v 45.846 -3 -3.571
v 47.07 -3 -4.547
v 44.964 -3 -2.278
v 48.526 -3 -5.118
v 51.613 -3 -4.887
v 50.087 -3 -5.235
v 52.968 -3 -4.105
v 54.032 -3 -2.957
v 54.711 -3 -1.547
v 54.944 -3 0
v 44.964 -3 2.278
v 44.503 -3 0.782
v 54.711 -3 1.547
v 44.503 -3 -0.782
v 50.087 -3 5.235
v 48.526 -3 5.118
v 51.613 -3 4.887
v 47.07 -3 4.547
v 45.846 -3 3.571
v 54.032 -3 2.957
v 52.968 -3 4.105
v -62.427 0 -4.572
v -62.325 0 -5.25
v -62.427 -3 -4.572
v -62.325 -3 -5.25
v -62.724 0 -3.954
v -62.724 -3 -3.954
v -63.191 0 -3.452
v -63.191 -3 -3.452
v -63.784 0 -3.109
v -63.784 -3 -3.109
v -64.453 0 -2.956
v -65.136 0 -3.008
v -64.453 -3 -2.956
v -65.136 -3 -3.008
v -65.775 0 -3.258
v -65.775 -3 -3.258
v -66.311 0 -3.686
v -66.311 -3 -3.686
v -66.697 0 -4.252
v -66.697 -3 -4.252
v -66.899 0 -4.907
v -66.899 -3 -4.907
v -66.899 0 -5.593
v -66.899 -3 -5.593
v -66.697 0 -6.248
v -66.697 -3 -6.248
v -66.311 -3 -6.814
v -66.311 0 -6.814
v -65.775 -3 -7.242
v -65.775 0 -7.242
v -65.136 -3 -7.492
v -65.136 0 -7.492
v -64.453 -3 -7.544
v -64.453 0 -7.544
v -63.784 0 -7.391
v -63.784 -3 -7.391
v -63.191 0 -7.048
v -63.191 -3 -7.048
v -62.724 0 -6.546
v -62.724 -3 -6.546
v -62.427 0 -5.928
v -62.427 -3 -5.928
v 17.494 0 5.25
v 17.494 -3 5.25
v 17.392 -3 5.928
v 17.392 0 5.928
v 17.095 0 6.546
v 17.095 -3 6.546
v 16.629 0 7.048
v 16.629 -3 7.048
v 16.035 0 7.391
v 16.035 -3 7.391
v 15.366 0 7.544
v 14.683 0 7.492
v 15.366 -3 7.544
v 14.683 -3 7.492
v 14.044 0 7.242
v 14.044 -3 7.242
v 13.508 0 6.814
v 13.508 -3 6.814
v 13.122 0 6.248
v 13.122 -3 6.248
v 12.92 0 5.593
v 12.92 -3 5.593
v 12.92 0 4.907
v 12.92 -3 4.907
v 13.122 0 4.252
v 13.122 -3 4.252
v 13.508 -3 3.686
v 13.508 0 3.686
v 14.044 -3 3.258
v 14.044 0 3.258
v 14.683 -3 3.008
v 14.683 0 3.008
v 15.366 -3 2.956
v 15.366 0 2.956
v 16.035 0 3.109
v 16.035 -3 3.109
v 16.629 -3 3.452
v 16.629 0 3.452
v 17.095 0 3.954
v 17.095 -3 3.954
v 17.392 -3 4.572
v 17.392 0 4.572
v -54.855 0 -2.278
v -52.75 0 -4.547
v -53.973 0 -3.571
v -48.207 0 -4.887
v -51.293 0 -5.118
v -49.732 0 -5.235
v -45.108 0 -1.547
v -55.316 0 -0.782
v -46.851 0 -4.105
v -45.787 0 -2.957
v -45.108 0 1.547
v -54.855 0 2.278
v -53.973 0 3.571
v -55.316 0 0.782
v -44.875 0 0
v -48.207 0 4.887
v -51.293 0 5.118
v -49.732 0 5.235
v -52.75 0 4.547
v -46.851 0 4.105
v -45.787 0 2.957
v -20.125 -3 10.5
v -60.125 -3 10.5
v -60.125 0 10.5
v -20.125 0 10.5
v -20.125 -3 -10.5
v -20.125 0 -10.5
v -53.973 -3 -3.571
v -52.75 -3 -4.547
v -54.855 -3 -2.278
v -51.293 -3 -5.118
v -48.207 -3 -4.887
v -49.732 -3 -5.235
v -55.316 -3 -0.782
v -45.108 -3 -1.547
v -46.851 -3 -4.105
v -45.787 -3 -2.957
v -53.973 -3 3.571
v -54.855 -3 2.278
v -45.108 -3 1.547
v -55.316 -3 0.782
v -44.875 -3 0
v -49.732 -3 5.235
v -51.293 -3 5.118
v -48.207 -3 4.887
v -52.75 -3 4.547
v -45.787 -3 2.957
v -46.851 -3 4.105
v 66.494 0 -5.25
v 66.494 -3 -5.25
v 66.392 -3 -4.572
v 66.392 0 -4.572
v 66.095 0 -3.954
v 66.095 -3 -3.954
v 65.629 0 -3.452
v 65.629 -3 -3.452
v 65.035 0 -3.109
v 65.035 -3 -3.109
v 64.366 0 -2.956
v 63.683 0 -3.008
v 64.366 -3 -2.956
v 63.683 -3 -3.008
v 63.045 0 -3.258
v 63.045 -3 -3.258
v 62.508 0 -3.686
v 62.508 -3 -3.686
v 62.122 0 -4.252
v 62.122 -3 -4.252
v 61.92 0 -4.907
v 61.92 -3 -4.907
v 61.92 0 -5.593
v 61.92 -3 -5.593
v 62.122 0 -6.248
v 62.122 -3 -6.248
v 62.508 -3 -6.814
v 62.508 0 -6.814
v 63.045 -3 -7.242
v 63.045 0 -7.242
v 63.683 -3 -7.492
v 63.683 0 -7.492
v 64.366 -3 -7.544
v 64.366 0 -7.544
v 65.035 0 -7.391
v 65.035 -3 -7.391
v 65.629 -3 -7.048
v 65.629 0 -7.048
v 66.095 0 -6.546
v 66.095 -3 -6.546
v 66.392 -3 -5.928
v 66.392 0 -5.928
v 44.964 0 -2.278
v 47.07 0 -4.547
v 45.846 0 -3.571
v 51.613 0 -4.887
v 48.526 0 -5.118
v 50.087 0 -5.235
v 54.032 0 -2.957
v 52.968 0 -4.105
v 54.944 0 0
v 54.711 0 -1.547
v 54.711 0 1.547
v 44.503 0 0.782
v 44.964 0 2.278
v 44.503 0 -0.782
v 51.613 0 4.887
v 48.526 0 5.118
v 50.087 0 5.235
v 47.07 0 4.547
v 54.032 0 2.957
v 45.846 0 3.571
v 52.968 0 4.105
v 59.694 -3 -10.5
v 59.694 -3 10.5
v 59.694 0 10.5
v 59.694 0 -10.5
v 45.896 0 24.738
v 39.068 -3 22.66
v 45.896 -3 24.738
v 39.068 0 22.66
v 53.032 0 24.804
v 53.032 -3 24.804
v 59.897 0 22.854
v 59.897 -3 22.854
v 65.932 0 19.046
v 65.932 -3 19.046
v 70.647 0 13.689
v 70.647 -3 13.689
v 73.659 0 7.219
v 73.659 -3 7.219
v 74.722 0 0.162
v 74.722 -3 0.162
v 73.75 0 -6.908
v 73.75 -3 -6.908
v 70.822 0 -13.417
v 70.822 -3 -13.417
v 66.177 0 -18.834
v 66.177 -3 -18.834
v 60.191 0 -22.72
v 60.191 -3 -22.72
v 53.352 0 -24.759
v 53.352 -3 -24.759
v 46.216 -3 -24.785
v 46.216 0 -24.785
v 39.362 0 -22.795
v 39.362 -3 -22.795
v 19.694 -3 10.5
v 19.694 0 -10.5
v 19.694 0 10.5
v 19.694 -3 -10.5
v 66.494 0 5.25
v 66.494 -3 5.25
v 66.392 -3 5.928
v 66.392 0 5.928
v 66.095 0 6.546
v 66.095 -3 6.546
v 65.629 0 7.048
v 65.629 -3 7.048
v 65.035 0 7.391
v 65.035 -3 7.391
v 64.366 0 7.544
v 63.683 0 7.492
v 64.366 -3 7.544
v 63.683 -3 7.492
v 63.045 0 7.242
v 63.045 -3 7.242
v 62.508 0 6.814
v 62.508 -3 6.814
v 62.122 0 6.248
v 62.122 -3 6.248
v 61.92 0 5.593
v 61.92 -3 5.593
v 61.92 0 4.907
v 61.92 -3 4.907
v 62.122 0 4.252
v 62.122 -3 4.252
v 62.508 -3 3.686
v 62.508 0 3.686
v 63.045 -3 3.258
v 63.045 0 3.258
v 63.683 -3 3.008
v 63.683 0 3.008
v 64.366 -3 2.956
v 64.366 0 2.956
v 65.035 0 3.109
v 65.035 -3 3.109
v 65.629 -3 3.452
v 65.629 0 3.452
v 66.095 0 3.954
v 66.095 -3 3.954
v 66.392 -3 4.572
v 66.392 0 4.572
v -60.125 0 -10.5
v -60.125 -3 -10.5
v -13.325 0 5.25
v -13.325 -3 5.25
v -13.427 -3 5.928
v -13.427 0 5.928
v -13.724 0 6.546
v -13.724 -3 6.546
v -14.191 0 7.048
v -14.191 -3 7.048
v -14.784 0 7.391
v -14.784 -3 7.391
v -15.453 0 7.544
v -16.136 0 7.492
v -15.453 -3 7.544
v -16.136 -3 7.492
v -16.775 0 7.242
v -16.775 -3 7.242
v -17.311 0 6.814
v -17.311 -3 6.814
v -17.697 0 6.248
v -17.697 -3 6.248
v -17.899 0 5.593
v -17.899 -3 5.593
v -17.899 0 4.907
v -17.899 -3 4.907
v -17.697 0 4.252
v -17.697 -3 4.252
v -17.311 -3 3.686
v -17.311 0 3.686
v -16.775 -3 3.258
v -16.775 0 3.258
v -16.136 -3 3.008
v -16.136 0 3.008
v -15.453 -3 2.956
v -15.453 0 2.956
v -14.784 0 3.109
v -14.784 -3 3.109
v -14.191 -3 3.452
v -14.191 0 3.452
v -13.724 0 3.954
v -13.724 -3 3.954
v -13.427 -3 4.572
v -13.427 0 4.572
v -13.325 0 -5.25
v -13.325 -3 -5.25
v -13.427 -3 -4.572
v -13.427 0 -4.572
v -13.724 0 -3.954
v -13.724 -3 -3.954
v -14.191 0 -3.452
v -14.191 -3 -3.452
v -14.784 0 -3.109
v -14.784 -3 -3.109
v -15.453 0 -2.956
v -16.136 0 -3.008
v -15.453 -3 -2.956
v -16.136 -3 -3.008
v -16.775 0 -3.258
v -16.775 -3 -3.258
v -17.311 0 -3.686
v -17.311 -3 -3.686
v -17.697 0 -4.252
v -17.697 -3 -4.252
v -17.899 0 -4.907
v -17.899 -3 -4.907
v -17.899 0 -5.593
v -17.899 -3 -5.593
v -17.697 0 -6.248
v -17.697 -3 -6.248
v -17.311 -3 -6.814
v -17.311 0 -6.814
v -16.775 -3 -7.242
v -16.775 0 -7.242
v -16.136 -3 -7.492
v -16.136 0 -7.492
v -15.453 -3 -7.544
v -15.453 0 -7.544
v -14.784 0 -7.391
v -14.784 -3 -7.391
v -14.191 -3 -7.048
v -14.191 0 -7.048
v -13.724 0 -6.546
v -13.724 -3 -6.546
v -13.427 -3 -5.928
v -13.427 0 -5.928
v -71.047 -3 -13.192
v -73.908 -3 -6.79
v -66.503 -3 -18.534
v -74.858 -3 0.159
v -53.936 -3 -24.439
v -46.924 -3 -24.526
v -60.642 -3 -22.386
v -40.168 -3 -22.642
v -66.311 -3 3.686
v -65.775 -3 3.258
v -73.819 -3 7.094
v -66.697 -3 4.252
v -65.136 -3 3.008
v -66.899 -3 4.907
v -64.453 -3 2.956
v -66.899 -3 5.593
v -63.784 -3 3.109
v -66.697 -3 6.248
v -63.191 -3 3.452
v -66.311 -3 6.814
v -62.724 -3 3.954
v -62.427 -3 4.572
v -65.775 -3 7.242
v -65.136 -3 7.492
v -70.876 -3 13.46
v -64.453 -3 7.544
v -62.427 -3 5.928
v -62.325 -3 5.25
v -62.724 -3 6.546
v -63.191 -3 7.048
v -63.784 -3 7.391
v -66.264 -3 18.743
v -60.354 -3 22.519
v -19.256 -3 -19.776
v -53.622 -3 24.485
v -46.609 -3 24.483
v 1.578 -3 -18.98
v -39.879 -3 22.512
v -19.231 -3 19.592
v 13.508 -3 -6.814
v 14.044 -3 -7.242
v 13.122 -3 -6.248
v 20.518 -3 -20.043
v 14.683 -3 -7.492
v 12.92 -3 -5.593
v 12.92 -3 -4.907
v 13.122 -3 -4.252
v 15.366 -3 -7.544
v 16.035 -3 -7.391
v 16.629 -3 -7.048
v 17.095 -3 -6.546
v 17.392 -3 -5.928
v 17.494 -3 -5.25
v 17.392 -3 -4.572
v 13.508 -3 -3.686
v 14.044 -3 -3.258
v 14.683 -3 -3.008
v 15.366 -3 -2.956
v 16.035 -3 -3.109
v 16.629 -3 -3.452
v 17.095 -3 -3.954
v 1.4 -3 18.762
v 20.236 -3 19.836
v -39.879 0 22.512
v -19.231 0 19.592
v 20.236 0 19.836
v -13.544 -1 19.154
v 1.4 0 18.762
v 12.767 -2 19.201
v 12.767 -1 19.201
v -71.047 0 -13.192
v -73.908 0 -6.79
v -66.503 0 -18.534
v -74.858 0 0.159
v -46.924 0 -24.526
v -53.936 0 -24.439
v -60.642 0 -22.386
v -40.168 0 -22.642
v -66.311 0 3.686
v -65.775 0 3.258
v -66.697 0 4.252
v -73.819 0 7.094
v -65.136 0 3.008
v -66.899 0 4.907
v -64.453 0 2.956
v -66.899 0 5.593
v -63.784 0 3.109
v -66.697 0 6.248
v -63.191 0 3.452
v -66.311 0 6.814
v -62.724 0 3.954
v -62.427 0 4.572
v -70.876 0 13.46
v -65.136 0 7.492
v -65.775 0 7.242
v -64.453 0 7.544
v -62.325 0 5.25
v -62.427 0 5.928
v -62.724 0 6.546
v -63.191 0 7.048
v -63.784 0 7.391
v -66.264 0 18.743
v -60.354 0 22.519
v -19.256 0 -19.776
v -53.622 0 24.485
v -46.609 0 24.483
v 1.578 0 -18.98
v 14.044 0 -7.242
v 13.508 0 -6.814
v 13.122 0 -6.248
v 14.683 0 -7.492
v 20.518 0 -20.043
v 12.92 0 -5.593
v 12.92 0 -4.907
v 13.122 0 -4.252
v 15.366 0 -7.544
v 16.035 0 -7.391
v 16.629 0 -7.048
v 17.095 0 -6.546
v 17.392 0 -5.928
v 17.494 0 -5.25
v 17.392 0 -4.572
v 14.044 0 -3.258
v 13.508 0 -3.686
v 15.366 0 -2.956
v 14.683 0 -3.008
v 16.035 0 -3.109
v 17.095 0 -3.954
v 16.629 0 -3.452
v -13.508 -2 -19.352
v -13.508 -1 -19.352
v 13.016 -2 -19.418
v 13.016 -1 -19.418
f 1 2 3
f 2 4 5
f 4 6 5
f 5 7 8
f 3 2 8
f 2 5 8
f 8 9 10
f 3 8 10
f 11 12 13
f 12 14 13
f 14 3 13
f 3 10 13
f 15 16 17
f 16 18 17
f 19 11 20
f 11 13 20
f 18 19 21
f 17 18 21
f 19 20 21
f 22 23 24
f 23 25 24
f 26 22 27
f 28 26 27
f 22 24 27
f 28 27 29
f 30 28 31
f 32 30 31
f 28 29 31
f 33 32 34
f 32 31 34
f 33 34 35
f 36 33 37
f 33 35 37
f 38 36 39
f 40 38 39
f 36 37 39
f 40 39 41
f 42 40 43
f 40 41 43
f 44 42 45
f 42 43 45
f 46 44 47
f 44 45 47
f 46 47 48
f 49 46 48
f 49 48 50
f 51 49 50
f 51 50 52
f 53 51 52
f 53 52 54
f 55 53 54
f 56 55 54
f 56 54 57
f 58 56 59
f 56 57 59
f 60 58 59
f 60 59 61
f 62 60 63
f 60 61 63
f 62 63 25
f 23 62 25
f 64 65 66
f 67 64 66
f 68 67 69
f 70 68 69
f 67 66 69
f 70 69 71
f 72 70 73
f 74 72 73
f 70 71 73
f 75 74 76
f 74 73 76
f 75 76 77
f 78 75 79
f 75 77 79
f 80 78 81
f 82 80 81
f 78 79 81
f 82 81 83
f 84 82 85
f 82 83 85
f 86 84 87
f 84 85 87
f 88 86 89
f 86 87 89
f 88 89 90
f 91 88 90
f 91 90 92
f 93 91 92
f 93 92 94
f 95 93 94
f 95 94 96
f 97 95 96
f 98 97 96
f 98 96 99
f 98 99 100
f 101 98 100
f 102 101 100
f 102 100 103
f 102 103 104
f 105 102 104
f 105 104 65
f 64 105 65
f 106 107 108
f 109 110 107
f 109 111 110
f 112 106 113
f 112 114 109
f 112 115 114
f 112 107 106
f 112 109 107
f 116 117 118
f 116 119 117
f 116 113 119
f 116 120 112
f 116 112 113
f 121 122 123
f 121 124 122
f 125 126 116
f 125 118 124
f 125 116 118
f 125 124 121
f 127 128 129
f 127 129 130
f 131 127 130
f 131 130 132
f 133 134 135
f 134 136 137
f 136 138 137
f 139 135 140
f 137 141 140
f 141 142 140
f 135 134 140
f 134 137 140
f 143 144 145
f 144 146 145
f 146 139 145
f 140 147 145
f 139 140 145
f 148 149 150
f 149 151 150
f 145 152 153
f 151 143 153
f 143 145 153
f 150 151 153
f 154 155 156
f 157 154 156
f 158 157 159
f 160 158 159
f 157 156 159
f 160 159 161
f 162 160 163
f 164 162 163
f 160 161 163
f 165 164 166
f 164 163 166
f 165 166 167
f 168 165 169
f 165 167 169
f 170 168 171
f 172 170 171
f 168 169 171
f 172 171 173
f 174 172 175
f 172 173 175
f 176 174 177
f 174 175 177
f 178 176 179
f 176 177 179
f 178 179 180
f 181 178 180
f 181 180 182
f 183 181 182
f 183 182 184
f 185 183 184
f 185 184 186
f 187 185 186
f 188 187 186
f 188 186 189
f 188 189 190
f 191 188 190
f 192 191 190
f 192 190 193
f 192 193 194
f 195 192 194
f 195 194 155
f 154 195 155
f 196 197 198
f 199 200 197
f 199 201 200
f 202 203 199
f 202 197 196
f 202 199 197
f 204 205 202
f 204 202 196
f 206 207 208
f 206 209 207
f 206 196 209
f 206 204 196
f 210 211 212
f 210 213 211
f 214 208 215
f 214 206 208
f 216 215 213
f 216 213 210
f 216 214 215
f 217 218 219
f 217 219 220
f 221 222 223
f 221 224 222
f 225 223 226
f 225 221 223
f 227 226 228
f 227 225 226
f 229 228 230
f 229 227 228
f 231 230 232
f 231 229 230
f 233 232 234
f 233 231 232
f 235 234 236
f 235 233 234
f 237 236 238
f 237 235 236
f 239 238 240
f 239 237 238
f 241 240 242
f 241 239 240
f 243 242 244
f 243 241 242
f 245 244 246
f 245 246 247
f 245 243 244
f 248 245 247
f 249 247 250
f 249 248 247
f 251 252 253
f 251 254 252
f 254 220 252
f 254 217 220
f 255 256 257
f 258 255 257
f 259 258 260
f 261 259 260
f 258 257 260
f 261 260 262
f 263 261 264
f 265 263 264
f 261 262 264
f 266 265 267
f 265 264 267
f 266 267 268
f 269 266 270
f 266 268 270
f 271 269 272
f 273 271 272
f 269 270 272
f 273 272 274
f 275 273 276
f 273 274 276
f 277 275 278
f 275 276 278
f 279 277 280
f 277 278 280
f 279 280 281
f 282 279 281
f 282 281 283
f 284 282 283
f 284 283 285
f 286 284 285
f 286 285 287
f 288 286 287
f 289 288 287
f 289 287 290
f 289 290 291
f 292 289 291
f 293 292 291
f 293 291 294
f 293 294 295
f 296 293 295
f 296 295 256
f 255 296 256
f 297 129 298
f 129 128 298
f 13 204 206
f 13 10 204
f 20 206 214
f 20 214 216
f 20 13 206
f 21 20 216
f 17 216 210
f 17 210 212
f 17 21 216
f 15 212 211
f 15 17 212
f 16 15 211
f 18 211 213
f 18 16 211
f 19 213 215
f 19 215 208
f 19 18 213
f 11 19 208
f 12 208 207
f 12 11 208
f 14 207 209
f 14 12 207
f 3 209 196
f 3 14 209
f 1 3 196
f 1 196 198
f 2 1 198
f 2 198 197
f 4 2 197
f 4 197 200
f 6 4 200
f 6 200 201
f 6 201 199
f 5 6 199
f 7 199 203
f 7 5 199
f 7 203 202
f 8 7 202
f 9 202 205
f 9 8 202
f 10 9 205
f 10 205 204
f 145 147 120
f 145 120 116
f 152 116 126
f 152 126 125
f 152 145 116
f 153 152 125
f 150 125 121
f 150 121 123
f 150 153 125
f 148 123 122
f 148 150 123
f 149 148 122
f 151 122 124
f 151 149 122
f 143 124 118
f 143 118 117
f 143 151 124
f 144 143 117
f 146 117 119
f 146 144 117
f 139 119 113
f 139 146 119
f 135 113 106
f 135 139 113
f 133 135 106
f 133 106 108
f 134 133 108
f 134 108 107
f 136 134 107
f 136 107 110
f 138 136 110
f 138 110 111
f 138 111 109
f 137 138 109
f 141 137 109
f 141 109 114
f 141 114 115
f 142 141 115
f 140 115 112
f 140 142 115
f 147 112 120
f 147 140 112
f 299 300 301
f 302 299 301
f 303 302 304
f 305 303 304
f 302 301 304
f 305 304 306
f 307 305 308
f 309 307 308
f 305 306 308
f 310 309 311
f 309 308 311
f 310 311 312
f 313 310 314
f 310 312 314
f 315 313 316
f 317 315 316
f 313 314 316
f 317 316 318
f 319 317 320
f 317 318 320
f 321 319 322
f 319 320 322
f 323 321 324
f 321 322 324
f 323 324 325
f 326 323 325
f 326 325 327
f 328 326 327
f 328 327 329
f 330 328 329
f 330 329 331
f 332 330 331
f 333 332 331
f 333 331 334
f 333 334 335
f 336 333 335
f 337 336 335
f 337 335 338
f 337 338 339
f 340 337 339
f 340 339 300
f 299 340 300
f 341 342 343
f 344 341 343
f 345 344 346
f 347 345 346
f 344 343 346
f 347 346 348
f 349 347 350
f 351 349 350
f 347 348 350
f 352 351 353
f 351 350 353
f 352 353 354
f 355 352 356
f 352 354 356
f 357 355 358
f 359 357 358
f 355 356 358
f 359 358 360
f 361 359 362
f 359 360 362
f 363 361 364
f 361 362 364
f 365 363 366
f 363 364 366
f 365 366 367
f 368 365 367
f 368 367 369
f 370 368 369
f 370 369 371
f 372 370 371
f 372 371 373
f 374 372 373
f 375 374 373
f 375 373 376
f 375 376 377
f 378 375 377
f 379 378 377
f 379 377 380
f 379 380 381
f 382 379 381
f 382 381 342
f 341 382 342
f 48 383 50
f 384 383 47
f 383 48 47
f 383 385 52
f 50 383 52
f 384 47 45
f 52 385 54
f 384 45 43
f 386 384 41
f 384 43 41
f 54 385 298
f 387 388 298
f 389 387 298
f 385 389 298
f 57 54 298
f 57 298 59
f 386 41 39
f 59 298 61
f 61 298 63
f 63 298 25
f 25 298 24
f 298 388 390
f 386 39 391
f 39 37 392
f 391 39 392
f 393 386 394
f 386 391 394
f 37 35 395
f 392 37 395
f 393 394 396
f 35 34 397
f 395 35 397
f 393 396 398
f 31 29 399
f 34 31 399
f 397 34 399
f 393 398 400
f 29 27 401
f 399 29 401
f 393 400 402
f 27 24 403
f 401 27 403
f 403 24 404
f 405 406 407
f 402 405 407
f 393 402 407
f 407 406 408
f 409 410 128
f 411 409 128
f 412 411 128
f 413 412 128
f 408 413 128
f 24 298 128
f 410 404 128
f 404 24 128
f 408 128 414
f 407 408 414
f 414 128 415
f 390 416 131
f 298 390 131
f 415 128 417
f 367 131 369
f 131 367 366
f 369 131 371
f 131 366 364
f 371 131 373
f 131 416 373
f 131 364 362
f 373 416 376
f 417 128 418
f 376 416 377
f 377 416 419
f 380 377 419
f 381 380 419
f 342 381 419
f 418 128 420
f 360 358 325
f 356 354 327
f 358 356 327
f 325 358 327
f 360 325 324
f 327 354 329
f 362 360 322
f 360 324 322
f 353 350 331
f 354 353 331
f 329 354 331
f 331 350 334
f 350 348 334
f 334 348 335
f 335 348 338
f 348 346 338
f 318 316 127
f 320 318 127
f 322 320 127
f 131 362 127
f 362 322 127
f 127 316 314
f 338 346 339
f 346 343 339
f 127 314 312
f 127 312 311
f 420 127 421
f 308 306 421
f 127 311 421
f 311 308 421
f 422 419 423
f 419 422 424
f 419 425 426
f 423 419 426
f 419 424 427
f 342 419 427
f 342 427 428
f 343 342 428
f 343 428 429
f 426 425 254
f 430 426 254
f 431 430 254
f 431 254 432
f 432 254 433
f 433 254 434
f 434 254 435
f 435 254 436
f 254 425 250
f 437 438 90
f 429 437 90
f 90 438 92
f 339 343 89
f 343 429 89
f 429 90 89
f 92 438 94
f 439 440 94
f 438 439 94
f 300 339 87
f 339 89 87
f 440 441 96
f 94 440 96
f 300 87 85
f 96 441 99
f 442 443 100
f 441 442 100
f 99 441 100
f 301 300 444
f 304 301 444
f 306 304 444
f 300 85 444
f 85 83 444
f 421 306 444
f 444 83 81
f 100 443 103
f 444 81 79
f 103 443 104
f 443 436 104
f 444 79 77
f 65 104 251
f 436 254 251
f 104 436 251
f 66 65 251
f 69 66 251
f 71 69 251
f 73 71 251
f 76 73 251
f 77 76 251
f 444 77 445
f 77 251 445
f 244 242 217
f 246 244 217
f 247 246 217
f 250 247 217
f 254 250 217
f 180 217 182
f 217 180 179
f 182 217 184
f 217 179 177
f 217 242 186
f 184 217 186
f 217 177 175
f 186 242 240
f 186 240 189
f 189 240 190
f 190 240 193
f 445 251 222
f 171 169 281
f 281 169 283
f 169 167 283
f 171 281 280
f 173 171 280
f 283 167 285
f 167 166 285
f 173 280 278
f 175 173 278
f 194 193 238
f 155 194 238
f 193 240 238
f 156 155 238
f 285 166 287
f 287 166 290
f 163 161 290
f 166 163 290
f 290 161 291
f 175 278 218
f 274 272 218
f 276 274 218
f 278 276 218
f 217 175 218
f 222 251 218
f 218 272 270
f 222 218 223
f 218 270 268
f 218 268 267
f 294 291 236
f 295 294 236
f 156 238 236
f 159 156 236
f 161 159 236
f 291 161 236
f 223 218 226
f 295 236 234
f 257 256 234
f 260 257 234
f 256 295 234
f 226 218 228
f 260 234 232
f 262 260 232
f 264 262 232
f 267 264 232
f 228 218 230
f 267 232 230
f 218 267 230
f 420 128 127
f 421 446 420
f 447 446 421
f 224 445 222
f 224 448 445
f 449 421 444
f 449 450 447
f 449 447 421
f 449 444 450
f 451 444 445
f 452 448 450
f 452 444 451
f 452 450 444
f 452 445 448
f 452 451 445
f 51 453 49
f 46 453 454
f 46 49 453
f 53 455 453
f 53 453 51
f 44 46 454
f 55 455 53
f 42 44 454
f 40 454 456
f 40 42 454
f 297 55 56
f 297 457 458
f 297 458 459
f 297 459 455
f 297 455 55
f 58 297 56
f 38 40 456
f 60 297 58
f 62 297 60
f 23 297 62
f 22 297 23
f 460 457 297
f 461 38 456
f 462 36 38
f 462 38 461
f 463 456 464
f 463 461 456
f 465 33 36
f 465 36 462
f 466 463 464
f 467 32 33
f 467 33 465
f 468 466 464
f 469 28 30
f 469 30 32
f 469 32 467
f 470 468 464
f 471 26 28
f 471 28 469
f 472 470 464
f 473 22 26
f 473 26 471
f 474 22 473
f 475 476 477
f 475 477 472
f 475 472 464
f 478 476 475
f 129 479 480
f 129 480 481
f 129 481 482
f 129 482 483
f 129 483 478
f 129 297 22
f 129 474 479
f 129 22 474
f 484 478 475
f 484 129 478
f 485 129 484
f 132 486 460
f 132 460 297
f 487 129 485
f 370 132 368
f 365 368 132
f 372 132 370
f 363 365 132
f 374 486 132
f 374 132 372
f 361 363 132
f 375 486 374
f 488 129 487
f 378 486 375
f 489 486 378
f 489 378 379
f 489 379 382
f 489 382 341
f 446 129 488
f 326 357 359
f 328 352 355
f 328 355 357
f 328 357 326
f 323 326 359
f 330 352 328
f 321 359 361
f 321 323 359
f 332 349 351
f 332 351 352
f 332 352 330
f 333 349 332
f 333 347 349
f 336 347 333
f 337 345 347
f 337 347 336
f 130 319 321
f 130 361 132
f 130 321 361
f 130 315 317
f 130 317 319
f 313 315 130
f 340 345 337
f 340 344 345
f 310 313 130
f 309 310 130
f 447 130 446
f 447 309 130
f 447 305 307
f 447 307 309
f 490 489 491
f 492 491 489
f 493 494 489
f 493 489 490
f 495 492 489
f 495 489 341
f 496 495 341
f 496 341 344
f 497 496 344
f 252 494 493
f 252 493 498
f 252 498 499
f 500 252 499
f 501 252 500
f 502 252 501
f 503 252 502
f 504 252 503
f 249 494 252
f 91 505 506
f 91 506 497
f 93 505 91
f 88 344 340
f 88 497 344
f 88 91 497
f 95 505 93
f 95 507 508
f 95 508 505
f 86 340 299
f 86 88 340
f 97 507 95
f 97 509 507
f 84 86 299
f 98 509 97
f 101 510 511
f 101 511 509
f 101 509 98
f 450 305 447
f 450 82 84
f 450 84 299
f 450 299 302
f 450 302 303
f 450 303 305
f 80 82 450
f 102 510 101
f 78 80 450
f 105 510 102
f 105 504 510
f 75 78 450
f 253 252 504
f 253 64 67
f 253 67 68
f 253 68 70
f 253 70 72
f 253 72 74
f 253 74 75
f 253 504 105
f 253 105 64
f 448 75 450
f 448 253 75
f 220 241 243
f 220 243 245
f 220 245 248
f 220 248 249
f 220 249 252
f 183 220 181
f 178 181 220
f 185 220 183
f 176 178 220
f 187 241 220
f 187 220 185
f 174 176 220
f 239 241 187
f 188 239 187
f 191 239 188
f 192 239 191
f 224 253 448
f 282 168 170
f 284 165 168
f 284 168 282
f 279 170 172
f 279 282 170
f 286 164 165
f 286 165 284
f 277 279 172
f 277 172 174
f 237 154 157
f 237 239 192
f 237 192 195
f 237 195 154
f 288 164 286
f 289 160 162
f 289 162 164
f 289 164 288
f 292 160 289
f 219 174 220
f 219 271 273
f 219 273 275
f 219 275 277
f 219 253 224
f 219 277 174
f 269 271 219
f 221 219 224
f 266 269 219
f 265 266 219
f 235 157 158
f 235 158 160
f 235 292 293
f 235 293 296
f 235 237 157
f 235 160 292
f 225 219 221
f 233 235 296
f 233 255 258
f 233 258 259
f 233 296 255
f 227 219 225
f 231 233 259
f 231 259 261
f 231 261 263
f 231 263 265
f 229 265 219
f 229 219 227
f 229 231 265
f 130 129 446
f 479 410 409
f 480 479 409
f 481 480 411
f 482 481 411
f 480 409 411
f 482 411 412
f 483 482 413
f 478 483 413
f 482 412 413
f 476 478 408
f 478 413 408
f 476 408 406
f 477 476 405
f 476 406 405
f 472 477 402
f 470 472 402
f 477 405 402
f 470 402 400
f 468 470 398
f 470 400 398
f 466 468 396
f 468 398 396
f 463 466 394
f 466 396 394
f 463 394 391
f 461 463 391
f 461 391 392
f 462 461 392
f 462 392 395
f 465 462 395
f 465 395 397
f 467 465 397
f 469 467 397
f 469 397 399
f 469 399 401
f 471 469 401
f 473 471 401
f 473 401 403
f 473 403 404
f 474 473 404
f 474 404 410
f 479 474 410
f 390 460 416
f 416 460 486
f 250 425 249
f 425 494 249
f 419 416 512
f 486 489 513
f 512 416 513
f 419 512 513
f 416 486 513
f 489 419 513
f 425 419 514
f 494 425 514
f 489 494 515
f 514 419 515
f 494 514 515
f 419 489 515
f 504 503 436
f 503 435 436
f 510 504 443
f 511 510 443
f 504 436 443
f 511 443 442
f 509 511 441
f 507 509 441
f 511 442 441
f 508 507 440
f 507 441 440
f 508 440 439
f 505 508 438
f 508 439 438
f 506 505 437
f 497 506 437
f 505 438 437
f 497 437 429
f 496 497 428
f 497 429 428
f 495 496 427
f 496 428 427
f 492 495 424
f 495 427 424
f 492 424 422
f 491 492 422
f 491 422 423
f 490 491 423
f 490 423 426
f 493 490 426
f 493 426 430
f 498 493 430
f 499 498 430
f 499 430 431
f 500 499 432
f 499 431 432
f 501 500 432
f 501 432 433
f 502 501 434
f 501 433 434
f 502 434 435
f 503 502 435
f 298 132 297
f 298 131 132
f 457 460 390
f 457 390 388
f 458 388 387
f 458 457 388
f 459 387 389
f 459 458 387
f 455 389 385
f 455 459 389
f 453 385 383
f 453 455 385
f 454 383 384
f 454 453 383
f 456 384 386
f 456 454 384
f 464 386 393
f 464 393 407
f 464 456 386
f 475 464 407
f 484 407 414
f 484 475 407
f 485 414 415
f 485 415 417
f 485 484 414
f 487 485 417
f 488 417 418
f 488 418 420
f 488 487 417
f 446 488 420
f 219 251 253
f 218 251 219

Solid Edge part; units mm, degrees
sketch "Sketch1" plane through (0, 0, 0) normal (0, -1, 0) x (1, 0, 0)
  spline S0 degree 3 poles (-39.8787, 22.5122) (-13.5278, 17.4556) (12.768, 17.491) (39.0683, 22.66) knots 0 0 0 0 1 1 1 1
  spline S1 degree 3 poles (-40.1683, -22.6417) (-13.4529, -17.6583) (13.1177, -17.7775) (39.362, -22.7954) knots 0 0 0 0 1 1 1 1
  arc A0 (-40.1683, -22.6417) -> (-39.8787, 22.5122) centre (-50.1246, 0) cw
  arc A1 (39.0683, 22.66) -> (39.362, -22.7954) centre (49.6945, 0) cw
extrude "Protrusion1" add sketch "Sketch1" along normal blind 3
sketch "Sketch2" plane through (-0.0682, -3, 0) normal (0, -1, 0) x (1, 0, 0)
  circle A0 centre (15.2627, 5.25) radius 2.3
  circle A1 centre (15.2627, -5.25) radius 2.3
  circle A2 centre (64.2627, 5.25) radius 2.3
  circle A3 centre (64.2627, -5.25) radius 2.3
  circle A4 centre (49.7627, 0) radius 5.25
  line L0 (-60.0564, 10.5) -> (-60.0564, -10.5)
  line L1 (-20.0564, -10.5) -> (-60.0564, -10.5)
  line L2 (-20.0564, 10.5) -> (-20.0564, -10.5)
  line L3 (-60.0564, 10.5) -> (-20.0564, 10.5)
  circle A5 centre (-15.5564, -5.25) radius 2.3
  circle A6 centre (-15.5564, 5.25) radius 2.3
  circle A7 centre (-64.5564, -5.25) radius 2.3
  circle A8 centre (-64.5564, 5.25) radius 2.3
  circle A9 centre (-50.0564, 0) radius 5.25
  line L4 (59.7627, 10.5) -> (59.7627, -10.5)
  line L5 (59.7627, -10.5) -> (19.7627, -10.5)
  line L6 (19.7627, -10.5) -> (19.7627, 10.5)
  line L7 (19.7627, 10.5) -> (59.7627, 10.5)
  dimension "D1" = 40
  dimension "D2" = 21
  dimension "D3" = 49
  dimension "D4" = 21
extrude "ExtrudedCutout_1" cut sketch "Sketch2" against normal blind 204.5918
